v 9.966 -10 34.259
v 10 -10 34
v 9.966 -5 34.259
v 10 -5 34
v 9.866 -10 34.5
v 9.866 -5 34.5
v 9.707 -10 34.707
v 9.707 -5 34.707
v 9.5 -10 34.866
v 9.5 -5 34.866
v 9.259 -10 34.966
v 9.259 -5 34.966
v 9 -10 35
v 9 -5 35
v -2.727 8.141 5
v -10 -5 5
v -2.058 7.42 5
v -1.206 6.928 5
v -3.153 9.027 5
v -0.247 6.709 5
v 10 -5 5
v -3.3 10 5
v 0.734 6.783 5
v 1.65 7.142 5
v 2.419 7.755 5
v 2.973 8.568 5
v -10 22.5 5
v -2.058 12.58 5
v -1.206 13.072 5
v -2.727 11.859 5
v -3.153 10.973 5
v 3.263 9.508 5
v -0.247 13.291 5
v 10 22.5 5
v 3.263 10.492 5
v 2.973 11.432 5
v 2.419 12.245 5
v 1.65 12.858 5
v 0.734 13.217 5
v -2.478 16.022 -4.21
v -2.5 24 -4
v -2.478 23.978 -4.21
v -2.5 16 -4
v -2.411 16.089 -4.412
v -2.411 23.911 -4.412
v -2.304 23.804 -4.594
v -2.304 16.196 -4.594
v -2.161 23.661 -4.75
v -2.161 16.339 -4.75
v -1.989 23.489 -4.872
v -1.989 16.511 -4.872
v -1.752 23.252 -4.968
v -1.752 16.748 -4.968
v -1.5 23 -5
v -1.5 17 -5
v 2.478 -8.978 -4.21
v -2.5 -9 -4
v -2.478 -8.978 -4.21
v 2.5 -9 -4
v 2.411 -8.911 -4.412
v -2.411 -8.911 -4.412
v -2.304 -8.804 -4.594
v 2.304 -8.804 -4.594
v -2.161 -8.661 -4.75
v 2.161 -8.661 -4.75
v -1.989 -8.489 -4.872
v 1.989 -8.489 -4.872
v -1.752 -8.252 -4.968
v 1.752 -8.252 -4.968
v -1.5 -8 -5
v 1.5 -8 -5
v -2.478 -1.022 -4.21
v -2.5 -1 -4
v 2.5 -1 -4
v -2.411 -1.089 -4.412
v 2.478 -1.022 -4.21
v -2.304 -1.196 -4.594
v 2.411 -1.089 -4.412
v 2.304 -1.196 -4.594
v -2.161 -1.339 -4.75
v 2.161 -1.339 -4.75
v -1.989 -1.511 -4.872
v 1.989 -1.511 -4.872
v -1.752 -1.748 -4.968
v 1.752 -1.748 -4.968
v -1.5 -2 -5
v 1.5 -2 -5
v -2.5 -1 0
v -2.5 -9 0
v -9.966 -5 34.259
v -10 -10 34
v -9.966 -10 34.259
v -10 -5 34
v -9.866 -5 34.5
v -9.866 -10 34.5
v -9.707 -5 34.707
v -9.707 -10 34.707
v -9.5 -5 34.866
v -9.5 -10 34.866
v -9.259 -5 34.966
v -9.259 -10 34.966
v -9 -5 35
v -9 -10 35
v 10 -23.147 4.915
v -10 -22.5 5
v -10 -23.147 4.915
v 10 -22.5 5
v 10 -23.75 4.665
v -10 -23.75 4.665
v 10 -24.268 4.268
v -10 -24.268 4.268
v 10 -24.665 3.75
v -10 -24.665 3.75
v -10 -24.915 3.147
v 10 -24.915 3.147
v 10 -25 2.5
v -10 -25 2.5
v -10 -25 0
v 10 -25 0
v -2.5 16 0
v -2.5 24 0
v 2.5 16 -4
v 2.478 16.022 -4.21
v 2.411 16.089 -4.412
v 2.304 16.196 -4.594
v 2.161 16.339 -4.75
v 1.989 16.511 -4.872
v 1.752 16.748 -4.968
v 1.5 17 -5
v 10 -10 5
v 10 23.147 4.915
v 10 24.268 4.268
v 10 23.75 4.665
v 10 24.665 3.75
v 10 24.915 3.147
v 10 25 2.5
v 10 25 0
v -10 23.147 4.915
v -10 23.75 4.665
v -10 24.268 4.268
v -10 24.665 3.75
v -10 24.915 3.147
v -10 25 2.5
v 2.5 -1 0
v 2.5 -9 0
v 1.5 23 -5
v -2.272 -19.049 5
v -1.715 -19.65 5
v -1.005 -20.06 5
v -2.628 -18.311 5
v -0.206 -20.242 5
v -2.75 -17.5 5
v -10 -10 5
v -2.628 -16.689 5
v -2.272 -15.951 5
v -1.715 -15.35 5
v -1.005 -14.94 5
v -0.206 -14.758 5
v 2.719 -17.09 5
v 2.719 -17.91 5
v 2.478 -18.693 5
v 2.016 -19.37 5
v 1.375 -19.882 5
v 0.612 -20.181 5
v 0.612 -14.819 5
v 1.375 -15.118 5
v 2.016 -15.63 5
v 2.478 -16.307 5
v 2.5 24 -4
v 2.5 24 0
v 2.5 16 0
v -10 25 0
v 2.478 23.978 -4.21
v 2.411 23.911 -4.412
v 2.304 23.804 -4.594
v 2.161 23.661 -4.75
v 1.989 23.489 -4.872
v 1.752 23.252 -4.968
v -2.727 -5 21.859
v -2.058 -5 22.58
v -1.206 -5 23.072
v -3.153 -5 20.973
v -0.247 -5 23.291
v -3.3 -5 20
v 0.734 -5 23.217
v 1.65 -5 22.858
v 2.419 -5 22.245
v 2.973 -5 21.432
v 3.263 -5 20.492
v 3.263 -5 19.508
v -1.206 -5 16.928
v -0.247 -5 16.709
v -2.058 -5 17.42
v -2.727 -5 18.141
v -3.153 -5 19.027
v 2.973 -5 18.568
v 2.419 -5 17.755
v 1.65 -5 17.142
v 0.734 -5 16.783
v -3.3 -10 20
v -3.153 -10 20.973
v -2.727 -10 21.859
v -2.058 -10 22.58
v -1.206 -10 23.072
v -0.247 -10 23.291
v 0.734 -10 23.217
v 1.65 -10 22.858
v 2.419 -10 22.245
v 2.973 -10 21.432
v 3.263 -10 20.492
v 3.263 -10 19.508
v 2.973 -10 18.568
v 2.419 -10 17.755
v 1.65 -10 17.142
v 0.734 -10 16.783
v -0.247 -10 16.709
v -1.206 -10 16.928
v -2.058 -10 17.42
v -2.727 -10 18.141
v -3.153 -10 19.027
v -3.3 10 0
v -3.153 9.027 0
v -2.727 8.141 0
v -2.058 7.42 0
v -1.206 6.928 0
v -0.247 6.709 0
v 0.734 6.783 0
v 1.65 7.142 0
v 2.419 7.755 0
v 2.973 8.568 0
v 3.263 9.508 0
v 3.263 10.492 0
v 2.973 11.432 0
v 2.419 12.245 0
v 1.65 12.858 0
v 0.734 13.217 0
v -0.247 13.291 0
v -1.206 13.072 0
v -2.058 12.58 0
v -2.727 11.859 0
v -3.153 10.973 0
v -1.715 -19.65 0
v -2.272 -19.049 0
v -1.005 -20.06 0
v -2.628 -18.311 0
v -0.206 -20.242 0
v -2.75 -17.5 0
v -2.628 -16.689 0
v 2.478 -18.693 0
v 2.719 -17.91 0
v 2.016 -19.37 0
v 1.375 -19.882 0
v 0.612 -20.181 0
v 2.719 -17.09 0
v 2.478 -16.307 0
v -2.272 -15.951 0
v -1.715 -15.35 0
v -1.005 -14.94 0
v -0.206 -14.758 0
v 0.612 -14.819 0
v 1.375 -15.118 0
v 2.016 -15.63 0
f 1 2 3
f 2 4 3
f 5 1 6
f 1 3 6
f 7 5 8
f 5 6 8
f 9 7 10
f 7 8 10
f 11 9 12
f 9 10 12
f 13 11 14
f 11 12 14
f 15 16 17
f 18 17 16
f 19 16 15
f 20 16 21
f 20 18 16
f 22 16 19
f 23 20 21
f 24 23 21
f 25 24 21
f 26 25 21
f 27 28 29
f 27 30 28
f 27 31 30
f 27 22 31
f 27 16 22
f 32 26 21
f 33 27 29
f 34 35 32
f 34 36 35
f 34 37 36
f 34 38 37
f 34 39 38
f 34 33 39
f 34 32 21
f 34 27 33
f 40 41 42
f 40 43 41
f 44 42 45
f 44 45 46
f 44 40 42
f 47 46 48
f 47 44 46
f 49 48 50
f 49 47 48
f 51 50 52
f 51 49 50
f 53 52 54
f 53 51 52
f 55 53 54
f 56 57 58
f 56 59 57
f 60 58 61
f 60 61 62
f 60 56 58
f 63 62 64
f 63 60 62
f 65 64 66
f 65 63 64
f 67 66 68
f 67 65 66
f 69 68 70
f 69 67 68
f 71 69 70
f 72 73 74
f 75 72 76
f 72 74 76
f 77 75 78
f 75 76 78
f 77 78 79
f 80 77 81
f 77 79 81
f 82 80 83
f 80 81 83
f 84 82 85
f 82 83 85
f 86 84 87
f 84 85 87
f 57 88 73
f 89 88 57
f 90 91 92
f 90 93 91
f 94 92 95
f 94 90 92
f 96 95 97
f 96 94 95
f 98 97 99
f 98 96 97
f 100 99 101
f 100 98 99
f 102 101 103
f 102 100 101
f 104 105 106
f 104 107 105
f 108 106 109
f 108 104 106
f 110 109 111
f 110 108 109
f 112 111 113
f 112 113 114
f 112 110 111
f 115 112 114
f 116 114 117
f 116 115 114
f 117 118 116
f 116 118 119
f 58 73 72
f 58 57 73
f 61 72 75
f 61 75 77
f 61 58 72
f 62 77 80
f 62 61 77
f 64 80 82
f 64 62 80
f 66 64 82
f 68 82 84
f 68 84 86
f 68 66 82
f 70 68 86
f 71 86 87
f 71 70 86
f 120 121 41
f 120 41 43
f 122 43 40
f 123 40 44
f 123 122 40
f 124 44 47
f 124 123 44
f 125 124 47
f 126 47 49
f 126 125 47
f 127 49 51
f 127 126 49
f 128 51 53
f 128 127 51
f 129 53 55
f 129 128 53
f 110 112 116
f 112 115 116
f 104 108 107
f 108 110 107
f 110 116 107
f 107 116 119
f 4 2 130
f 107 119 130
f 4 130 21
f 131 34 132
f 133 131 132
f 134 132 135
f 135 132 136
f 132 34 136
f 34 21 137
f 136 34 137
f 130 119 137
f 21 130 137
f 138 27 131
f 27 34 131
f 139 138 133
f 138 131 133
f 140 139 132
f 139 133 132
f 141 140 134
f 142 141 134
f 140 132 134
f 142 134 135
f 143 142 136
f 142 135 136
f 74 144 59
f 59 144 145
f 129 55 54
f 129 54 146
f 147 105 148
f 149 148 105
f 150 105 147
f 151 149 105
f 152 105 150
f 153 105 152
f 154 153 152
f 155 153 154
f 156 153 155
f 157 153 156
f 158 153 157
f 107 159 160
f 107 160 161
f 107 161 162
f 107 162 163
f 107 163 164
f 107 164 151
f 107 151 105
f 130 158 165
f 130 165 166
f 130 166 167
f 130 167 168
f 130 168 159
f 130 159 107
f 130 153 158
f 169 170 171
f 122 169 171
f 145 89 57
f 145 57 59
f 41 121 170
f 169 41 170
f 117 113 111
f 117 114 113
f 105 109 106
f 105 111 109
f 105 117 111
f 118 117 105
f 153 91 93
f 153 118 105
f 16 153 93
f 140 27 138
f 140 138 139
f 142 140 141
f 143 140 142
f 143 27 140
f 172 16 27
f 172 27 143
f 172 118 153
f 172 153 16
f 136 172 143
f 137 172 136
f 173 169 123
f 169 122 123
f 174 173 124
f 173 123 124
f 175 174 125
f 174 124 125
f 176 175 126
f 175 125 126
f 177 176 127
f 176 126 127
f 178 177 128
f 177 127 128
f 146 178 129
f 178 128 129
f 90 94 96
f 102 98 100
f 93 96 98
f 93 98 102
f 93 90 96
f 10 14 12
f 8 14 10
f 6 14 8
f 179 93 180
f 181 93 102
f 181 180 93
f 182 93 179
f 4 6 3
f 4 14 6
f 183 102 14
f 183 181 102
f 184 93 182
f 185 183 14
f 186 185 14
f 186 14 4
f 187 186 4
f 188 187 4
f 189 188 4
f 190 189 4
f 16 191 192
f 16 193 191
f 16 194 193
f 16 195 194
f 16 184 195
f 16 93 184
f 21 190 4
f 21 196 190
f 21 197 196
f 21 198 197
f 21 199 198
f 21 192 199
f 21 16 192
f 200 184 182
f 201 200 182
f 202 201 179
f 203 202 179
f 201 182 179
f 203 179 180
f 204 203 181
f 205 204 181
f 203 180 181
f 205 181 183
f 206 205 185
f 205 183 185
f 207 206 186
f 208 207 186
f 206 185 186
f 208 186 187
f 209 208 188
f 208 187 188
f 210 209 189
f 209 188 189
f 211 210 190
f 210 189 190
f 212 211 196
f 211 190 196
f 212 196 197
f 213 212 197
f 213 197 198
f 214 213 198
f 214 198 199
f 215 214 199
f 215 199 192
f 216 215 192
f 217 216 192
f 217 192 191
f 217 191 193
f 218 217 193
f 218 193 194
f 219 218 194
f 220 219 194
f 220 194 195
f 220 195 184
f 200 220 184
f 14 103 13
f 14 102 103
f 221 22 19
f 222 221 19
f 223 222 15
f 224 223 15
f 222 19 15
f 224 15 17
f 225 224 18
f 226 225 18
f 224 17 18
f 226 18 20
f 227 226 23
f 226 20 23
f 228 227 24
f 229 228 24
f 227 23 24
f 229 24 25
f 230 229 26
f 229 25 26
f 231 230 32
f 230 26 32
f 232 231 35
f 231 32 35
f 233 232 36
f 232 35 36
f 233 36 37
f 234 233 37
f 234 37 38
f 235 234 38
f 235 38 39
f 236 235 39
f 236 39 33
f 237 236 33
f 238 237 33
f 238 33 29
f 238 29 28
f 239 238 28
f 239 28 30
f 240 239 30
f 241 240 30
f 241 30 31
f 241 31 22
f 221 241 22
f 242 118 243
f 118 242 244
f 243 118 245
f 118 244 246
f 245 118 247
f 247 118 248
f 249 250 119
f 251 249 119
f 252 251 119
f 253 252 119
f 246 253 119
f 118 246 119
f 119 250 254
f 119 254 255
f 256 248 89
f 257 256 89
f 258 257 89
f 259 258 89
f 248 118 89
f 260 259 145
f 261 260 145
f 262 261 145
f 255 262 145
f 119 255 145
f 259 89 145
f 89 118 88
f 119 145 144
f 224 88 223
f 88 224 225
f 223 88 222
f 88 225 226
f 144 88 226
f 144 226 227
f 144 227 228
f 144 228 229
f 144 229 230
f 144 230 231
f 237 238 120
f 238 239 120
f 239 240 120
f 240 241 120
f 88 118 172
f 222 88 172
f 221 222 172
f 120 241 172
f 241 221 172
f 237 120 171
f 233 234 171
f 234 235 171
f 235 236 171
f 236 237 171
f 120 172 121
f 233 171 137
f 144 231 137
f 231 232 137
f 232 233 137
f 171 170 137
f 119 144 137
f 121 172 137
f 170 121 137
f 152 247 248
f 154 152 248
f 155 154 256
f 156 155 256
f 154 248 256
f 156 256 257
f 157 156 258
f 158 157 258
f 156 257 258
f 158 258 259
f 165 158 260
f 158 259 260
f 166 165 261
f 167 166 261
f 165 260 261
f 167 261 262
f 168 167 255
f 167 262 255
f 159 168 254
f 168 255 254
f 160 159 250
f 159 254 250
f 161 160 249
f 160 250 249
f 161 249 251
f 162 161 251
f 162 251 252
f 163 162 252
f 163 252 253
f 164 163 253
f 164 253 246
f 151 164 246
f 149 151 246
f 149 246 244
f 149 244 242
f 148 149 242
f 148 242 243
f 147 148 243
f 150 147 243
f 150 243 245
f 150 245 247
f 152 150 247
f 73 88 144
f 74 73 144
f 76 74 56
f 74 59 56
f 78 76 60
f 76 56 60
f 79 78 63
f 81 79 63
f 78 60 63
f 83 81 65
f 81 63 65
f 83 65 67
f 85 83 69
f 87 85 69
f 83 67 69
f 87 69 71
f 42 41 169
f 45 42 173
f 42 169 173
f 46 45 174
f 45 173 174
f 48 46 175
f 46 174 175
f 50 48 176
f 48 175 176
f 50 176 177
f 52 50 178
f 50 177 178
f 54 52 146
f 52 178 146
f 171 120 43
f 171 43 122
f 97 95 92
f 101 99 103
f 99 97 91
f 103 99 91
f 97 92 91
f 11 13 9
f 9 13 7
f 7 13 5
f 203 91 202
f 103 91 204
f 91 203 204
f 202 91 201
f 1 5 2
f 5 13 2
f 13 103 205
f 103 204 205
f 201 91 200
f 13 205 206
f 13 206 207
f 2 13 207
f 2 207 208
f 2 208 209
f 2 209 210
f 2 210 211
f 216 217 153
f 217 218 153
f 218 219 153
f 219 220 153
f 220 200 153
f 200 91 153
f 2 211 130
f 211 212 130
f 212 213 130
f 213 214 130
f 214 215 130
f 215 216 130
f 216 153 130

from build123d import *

# Parameters (mm, degrees)
F0_W     = 20
F0_H     = 50
F1_DEPTH = 5
F2_W     = 5
F2_H     = 8
F3_DEPTH = 5
F4_R     = 1
F6_D     = 6.6
F7_W     = 20
F7_H     = 5
F8_DEPTH = 30
F9_R     = 1
F11_D    = 6.6
F13_D    = 5.5
F14_R    = 2.5


with BuildPart() as f1:
    # F0 (on Top) → F1 (new body)
    with BuildSketch(Plane.XY):
        Rectangle(F0_W, F0_H)
    extrude(amount=F1_DEPTH)

    # F2 (on face) → F3 (join)
    with BuildSketch(Plane(origin=(0, 0, 0), x_dir=(1, 0, 0), z_dir=(0, 0, -1))):
        with Locations((0, -20)):
            Rectangle(F2_W, F2_H)
        with Locations((0, 5)):
            Rectangle(F2_W, F2_H)
    extrude(amount=F3_DEPTH)

    # F4
    f4_edges = [f1.edges().sort_by_distance(p)[0] for p in [
        (2.5, 20, -5),
        (-2.5, 20, -5),
        (0, 24, -5),
        (0, 16, -5),
        (0, -1, -5),
        (-2.5, -5, -5),
        (0, -9, -5),
        (2.5, -5, -5),
    ]]
    fillet(f4_edges, radius=F4_R)

    # F6 (through all)
    with Locations(Plane(origin=(0, 0, 0), x_dir=(1, 0, 0), z_dir=(0, 0, -1))):
        with Locations((0, -10)):
            Hole(F6_D / 2)

    # F7 (on face) → F8 (join)
    with BuildSketch(Plane.XY.offset(5)):
        with Locations((0, -7.5)):
            Rectangle(F7_W, F7_H)
    extrude(amount=F8_DEPTH)

    # F9
    f9_edges = [f1.edges().sort_by_distance(p)[0] for p in [
        (10, -7.5, 35),
        (-10, -7.5, 35),
    ]]
    fillet(f9_edges, radius=F9_R)

    # F11 (through all)
    with Locations(Plane.XZ.offset(10)):
        with Locations((0, 20)):
            Hole(F11_D / 2)

    # F13 (through all)
    with Locations(Plane.XY.offset(5)):
        with Locations((0, -17.5)):
            Hole(F13_D / 2)

    # F14
    f14_edges = [f1.edges().sort_by_distance(p)[0] for p in [
        (0, 25, 5),
        (0, -25, 5),
    ]]
    fillet(f14_edges, radius=F14_R)


solid = f1.part
